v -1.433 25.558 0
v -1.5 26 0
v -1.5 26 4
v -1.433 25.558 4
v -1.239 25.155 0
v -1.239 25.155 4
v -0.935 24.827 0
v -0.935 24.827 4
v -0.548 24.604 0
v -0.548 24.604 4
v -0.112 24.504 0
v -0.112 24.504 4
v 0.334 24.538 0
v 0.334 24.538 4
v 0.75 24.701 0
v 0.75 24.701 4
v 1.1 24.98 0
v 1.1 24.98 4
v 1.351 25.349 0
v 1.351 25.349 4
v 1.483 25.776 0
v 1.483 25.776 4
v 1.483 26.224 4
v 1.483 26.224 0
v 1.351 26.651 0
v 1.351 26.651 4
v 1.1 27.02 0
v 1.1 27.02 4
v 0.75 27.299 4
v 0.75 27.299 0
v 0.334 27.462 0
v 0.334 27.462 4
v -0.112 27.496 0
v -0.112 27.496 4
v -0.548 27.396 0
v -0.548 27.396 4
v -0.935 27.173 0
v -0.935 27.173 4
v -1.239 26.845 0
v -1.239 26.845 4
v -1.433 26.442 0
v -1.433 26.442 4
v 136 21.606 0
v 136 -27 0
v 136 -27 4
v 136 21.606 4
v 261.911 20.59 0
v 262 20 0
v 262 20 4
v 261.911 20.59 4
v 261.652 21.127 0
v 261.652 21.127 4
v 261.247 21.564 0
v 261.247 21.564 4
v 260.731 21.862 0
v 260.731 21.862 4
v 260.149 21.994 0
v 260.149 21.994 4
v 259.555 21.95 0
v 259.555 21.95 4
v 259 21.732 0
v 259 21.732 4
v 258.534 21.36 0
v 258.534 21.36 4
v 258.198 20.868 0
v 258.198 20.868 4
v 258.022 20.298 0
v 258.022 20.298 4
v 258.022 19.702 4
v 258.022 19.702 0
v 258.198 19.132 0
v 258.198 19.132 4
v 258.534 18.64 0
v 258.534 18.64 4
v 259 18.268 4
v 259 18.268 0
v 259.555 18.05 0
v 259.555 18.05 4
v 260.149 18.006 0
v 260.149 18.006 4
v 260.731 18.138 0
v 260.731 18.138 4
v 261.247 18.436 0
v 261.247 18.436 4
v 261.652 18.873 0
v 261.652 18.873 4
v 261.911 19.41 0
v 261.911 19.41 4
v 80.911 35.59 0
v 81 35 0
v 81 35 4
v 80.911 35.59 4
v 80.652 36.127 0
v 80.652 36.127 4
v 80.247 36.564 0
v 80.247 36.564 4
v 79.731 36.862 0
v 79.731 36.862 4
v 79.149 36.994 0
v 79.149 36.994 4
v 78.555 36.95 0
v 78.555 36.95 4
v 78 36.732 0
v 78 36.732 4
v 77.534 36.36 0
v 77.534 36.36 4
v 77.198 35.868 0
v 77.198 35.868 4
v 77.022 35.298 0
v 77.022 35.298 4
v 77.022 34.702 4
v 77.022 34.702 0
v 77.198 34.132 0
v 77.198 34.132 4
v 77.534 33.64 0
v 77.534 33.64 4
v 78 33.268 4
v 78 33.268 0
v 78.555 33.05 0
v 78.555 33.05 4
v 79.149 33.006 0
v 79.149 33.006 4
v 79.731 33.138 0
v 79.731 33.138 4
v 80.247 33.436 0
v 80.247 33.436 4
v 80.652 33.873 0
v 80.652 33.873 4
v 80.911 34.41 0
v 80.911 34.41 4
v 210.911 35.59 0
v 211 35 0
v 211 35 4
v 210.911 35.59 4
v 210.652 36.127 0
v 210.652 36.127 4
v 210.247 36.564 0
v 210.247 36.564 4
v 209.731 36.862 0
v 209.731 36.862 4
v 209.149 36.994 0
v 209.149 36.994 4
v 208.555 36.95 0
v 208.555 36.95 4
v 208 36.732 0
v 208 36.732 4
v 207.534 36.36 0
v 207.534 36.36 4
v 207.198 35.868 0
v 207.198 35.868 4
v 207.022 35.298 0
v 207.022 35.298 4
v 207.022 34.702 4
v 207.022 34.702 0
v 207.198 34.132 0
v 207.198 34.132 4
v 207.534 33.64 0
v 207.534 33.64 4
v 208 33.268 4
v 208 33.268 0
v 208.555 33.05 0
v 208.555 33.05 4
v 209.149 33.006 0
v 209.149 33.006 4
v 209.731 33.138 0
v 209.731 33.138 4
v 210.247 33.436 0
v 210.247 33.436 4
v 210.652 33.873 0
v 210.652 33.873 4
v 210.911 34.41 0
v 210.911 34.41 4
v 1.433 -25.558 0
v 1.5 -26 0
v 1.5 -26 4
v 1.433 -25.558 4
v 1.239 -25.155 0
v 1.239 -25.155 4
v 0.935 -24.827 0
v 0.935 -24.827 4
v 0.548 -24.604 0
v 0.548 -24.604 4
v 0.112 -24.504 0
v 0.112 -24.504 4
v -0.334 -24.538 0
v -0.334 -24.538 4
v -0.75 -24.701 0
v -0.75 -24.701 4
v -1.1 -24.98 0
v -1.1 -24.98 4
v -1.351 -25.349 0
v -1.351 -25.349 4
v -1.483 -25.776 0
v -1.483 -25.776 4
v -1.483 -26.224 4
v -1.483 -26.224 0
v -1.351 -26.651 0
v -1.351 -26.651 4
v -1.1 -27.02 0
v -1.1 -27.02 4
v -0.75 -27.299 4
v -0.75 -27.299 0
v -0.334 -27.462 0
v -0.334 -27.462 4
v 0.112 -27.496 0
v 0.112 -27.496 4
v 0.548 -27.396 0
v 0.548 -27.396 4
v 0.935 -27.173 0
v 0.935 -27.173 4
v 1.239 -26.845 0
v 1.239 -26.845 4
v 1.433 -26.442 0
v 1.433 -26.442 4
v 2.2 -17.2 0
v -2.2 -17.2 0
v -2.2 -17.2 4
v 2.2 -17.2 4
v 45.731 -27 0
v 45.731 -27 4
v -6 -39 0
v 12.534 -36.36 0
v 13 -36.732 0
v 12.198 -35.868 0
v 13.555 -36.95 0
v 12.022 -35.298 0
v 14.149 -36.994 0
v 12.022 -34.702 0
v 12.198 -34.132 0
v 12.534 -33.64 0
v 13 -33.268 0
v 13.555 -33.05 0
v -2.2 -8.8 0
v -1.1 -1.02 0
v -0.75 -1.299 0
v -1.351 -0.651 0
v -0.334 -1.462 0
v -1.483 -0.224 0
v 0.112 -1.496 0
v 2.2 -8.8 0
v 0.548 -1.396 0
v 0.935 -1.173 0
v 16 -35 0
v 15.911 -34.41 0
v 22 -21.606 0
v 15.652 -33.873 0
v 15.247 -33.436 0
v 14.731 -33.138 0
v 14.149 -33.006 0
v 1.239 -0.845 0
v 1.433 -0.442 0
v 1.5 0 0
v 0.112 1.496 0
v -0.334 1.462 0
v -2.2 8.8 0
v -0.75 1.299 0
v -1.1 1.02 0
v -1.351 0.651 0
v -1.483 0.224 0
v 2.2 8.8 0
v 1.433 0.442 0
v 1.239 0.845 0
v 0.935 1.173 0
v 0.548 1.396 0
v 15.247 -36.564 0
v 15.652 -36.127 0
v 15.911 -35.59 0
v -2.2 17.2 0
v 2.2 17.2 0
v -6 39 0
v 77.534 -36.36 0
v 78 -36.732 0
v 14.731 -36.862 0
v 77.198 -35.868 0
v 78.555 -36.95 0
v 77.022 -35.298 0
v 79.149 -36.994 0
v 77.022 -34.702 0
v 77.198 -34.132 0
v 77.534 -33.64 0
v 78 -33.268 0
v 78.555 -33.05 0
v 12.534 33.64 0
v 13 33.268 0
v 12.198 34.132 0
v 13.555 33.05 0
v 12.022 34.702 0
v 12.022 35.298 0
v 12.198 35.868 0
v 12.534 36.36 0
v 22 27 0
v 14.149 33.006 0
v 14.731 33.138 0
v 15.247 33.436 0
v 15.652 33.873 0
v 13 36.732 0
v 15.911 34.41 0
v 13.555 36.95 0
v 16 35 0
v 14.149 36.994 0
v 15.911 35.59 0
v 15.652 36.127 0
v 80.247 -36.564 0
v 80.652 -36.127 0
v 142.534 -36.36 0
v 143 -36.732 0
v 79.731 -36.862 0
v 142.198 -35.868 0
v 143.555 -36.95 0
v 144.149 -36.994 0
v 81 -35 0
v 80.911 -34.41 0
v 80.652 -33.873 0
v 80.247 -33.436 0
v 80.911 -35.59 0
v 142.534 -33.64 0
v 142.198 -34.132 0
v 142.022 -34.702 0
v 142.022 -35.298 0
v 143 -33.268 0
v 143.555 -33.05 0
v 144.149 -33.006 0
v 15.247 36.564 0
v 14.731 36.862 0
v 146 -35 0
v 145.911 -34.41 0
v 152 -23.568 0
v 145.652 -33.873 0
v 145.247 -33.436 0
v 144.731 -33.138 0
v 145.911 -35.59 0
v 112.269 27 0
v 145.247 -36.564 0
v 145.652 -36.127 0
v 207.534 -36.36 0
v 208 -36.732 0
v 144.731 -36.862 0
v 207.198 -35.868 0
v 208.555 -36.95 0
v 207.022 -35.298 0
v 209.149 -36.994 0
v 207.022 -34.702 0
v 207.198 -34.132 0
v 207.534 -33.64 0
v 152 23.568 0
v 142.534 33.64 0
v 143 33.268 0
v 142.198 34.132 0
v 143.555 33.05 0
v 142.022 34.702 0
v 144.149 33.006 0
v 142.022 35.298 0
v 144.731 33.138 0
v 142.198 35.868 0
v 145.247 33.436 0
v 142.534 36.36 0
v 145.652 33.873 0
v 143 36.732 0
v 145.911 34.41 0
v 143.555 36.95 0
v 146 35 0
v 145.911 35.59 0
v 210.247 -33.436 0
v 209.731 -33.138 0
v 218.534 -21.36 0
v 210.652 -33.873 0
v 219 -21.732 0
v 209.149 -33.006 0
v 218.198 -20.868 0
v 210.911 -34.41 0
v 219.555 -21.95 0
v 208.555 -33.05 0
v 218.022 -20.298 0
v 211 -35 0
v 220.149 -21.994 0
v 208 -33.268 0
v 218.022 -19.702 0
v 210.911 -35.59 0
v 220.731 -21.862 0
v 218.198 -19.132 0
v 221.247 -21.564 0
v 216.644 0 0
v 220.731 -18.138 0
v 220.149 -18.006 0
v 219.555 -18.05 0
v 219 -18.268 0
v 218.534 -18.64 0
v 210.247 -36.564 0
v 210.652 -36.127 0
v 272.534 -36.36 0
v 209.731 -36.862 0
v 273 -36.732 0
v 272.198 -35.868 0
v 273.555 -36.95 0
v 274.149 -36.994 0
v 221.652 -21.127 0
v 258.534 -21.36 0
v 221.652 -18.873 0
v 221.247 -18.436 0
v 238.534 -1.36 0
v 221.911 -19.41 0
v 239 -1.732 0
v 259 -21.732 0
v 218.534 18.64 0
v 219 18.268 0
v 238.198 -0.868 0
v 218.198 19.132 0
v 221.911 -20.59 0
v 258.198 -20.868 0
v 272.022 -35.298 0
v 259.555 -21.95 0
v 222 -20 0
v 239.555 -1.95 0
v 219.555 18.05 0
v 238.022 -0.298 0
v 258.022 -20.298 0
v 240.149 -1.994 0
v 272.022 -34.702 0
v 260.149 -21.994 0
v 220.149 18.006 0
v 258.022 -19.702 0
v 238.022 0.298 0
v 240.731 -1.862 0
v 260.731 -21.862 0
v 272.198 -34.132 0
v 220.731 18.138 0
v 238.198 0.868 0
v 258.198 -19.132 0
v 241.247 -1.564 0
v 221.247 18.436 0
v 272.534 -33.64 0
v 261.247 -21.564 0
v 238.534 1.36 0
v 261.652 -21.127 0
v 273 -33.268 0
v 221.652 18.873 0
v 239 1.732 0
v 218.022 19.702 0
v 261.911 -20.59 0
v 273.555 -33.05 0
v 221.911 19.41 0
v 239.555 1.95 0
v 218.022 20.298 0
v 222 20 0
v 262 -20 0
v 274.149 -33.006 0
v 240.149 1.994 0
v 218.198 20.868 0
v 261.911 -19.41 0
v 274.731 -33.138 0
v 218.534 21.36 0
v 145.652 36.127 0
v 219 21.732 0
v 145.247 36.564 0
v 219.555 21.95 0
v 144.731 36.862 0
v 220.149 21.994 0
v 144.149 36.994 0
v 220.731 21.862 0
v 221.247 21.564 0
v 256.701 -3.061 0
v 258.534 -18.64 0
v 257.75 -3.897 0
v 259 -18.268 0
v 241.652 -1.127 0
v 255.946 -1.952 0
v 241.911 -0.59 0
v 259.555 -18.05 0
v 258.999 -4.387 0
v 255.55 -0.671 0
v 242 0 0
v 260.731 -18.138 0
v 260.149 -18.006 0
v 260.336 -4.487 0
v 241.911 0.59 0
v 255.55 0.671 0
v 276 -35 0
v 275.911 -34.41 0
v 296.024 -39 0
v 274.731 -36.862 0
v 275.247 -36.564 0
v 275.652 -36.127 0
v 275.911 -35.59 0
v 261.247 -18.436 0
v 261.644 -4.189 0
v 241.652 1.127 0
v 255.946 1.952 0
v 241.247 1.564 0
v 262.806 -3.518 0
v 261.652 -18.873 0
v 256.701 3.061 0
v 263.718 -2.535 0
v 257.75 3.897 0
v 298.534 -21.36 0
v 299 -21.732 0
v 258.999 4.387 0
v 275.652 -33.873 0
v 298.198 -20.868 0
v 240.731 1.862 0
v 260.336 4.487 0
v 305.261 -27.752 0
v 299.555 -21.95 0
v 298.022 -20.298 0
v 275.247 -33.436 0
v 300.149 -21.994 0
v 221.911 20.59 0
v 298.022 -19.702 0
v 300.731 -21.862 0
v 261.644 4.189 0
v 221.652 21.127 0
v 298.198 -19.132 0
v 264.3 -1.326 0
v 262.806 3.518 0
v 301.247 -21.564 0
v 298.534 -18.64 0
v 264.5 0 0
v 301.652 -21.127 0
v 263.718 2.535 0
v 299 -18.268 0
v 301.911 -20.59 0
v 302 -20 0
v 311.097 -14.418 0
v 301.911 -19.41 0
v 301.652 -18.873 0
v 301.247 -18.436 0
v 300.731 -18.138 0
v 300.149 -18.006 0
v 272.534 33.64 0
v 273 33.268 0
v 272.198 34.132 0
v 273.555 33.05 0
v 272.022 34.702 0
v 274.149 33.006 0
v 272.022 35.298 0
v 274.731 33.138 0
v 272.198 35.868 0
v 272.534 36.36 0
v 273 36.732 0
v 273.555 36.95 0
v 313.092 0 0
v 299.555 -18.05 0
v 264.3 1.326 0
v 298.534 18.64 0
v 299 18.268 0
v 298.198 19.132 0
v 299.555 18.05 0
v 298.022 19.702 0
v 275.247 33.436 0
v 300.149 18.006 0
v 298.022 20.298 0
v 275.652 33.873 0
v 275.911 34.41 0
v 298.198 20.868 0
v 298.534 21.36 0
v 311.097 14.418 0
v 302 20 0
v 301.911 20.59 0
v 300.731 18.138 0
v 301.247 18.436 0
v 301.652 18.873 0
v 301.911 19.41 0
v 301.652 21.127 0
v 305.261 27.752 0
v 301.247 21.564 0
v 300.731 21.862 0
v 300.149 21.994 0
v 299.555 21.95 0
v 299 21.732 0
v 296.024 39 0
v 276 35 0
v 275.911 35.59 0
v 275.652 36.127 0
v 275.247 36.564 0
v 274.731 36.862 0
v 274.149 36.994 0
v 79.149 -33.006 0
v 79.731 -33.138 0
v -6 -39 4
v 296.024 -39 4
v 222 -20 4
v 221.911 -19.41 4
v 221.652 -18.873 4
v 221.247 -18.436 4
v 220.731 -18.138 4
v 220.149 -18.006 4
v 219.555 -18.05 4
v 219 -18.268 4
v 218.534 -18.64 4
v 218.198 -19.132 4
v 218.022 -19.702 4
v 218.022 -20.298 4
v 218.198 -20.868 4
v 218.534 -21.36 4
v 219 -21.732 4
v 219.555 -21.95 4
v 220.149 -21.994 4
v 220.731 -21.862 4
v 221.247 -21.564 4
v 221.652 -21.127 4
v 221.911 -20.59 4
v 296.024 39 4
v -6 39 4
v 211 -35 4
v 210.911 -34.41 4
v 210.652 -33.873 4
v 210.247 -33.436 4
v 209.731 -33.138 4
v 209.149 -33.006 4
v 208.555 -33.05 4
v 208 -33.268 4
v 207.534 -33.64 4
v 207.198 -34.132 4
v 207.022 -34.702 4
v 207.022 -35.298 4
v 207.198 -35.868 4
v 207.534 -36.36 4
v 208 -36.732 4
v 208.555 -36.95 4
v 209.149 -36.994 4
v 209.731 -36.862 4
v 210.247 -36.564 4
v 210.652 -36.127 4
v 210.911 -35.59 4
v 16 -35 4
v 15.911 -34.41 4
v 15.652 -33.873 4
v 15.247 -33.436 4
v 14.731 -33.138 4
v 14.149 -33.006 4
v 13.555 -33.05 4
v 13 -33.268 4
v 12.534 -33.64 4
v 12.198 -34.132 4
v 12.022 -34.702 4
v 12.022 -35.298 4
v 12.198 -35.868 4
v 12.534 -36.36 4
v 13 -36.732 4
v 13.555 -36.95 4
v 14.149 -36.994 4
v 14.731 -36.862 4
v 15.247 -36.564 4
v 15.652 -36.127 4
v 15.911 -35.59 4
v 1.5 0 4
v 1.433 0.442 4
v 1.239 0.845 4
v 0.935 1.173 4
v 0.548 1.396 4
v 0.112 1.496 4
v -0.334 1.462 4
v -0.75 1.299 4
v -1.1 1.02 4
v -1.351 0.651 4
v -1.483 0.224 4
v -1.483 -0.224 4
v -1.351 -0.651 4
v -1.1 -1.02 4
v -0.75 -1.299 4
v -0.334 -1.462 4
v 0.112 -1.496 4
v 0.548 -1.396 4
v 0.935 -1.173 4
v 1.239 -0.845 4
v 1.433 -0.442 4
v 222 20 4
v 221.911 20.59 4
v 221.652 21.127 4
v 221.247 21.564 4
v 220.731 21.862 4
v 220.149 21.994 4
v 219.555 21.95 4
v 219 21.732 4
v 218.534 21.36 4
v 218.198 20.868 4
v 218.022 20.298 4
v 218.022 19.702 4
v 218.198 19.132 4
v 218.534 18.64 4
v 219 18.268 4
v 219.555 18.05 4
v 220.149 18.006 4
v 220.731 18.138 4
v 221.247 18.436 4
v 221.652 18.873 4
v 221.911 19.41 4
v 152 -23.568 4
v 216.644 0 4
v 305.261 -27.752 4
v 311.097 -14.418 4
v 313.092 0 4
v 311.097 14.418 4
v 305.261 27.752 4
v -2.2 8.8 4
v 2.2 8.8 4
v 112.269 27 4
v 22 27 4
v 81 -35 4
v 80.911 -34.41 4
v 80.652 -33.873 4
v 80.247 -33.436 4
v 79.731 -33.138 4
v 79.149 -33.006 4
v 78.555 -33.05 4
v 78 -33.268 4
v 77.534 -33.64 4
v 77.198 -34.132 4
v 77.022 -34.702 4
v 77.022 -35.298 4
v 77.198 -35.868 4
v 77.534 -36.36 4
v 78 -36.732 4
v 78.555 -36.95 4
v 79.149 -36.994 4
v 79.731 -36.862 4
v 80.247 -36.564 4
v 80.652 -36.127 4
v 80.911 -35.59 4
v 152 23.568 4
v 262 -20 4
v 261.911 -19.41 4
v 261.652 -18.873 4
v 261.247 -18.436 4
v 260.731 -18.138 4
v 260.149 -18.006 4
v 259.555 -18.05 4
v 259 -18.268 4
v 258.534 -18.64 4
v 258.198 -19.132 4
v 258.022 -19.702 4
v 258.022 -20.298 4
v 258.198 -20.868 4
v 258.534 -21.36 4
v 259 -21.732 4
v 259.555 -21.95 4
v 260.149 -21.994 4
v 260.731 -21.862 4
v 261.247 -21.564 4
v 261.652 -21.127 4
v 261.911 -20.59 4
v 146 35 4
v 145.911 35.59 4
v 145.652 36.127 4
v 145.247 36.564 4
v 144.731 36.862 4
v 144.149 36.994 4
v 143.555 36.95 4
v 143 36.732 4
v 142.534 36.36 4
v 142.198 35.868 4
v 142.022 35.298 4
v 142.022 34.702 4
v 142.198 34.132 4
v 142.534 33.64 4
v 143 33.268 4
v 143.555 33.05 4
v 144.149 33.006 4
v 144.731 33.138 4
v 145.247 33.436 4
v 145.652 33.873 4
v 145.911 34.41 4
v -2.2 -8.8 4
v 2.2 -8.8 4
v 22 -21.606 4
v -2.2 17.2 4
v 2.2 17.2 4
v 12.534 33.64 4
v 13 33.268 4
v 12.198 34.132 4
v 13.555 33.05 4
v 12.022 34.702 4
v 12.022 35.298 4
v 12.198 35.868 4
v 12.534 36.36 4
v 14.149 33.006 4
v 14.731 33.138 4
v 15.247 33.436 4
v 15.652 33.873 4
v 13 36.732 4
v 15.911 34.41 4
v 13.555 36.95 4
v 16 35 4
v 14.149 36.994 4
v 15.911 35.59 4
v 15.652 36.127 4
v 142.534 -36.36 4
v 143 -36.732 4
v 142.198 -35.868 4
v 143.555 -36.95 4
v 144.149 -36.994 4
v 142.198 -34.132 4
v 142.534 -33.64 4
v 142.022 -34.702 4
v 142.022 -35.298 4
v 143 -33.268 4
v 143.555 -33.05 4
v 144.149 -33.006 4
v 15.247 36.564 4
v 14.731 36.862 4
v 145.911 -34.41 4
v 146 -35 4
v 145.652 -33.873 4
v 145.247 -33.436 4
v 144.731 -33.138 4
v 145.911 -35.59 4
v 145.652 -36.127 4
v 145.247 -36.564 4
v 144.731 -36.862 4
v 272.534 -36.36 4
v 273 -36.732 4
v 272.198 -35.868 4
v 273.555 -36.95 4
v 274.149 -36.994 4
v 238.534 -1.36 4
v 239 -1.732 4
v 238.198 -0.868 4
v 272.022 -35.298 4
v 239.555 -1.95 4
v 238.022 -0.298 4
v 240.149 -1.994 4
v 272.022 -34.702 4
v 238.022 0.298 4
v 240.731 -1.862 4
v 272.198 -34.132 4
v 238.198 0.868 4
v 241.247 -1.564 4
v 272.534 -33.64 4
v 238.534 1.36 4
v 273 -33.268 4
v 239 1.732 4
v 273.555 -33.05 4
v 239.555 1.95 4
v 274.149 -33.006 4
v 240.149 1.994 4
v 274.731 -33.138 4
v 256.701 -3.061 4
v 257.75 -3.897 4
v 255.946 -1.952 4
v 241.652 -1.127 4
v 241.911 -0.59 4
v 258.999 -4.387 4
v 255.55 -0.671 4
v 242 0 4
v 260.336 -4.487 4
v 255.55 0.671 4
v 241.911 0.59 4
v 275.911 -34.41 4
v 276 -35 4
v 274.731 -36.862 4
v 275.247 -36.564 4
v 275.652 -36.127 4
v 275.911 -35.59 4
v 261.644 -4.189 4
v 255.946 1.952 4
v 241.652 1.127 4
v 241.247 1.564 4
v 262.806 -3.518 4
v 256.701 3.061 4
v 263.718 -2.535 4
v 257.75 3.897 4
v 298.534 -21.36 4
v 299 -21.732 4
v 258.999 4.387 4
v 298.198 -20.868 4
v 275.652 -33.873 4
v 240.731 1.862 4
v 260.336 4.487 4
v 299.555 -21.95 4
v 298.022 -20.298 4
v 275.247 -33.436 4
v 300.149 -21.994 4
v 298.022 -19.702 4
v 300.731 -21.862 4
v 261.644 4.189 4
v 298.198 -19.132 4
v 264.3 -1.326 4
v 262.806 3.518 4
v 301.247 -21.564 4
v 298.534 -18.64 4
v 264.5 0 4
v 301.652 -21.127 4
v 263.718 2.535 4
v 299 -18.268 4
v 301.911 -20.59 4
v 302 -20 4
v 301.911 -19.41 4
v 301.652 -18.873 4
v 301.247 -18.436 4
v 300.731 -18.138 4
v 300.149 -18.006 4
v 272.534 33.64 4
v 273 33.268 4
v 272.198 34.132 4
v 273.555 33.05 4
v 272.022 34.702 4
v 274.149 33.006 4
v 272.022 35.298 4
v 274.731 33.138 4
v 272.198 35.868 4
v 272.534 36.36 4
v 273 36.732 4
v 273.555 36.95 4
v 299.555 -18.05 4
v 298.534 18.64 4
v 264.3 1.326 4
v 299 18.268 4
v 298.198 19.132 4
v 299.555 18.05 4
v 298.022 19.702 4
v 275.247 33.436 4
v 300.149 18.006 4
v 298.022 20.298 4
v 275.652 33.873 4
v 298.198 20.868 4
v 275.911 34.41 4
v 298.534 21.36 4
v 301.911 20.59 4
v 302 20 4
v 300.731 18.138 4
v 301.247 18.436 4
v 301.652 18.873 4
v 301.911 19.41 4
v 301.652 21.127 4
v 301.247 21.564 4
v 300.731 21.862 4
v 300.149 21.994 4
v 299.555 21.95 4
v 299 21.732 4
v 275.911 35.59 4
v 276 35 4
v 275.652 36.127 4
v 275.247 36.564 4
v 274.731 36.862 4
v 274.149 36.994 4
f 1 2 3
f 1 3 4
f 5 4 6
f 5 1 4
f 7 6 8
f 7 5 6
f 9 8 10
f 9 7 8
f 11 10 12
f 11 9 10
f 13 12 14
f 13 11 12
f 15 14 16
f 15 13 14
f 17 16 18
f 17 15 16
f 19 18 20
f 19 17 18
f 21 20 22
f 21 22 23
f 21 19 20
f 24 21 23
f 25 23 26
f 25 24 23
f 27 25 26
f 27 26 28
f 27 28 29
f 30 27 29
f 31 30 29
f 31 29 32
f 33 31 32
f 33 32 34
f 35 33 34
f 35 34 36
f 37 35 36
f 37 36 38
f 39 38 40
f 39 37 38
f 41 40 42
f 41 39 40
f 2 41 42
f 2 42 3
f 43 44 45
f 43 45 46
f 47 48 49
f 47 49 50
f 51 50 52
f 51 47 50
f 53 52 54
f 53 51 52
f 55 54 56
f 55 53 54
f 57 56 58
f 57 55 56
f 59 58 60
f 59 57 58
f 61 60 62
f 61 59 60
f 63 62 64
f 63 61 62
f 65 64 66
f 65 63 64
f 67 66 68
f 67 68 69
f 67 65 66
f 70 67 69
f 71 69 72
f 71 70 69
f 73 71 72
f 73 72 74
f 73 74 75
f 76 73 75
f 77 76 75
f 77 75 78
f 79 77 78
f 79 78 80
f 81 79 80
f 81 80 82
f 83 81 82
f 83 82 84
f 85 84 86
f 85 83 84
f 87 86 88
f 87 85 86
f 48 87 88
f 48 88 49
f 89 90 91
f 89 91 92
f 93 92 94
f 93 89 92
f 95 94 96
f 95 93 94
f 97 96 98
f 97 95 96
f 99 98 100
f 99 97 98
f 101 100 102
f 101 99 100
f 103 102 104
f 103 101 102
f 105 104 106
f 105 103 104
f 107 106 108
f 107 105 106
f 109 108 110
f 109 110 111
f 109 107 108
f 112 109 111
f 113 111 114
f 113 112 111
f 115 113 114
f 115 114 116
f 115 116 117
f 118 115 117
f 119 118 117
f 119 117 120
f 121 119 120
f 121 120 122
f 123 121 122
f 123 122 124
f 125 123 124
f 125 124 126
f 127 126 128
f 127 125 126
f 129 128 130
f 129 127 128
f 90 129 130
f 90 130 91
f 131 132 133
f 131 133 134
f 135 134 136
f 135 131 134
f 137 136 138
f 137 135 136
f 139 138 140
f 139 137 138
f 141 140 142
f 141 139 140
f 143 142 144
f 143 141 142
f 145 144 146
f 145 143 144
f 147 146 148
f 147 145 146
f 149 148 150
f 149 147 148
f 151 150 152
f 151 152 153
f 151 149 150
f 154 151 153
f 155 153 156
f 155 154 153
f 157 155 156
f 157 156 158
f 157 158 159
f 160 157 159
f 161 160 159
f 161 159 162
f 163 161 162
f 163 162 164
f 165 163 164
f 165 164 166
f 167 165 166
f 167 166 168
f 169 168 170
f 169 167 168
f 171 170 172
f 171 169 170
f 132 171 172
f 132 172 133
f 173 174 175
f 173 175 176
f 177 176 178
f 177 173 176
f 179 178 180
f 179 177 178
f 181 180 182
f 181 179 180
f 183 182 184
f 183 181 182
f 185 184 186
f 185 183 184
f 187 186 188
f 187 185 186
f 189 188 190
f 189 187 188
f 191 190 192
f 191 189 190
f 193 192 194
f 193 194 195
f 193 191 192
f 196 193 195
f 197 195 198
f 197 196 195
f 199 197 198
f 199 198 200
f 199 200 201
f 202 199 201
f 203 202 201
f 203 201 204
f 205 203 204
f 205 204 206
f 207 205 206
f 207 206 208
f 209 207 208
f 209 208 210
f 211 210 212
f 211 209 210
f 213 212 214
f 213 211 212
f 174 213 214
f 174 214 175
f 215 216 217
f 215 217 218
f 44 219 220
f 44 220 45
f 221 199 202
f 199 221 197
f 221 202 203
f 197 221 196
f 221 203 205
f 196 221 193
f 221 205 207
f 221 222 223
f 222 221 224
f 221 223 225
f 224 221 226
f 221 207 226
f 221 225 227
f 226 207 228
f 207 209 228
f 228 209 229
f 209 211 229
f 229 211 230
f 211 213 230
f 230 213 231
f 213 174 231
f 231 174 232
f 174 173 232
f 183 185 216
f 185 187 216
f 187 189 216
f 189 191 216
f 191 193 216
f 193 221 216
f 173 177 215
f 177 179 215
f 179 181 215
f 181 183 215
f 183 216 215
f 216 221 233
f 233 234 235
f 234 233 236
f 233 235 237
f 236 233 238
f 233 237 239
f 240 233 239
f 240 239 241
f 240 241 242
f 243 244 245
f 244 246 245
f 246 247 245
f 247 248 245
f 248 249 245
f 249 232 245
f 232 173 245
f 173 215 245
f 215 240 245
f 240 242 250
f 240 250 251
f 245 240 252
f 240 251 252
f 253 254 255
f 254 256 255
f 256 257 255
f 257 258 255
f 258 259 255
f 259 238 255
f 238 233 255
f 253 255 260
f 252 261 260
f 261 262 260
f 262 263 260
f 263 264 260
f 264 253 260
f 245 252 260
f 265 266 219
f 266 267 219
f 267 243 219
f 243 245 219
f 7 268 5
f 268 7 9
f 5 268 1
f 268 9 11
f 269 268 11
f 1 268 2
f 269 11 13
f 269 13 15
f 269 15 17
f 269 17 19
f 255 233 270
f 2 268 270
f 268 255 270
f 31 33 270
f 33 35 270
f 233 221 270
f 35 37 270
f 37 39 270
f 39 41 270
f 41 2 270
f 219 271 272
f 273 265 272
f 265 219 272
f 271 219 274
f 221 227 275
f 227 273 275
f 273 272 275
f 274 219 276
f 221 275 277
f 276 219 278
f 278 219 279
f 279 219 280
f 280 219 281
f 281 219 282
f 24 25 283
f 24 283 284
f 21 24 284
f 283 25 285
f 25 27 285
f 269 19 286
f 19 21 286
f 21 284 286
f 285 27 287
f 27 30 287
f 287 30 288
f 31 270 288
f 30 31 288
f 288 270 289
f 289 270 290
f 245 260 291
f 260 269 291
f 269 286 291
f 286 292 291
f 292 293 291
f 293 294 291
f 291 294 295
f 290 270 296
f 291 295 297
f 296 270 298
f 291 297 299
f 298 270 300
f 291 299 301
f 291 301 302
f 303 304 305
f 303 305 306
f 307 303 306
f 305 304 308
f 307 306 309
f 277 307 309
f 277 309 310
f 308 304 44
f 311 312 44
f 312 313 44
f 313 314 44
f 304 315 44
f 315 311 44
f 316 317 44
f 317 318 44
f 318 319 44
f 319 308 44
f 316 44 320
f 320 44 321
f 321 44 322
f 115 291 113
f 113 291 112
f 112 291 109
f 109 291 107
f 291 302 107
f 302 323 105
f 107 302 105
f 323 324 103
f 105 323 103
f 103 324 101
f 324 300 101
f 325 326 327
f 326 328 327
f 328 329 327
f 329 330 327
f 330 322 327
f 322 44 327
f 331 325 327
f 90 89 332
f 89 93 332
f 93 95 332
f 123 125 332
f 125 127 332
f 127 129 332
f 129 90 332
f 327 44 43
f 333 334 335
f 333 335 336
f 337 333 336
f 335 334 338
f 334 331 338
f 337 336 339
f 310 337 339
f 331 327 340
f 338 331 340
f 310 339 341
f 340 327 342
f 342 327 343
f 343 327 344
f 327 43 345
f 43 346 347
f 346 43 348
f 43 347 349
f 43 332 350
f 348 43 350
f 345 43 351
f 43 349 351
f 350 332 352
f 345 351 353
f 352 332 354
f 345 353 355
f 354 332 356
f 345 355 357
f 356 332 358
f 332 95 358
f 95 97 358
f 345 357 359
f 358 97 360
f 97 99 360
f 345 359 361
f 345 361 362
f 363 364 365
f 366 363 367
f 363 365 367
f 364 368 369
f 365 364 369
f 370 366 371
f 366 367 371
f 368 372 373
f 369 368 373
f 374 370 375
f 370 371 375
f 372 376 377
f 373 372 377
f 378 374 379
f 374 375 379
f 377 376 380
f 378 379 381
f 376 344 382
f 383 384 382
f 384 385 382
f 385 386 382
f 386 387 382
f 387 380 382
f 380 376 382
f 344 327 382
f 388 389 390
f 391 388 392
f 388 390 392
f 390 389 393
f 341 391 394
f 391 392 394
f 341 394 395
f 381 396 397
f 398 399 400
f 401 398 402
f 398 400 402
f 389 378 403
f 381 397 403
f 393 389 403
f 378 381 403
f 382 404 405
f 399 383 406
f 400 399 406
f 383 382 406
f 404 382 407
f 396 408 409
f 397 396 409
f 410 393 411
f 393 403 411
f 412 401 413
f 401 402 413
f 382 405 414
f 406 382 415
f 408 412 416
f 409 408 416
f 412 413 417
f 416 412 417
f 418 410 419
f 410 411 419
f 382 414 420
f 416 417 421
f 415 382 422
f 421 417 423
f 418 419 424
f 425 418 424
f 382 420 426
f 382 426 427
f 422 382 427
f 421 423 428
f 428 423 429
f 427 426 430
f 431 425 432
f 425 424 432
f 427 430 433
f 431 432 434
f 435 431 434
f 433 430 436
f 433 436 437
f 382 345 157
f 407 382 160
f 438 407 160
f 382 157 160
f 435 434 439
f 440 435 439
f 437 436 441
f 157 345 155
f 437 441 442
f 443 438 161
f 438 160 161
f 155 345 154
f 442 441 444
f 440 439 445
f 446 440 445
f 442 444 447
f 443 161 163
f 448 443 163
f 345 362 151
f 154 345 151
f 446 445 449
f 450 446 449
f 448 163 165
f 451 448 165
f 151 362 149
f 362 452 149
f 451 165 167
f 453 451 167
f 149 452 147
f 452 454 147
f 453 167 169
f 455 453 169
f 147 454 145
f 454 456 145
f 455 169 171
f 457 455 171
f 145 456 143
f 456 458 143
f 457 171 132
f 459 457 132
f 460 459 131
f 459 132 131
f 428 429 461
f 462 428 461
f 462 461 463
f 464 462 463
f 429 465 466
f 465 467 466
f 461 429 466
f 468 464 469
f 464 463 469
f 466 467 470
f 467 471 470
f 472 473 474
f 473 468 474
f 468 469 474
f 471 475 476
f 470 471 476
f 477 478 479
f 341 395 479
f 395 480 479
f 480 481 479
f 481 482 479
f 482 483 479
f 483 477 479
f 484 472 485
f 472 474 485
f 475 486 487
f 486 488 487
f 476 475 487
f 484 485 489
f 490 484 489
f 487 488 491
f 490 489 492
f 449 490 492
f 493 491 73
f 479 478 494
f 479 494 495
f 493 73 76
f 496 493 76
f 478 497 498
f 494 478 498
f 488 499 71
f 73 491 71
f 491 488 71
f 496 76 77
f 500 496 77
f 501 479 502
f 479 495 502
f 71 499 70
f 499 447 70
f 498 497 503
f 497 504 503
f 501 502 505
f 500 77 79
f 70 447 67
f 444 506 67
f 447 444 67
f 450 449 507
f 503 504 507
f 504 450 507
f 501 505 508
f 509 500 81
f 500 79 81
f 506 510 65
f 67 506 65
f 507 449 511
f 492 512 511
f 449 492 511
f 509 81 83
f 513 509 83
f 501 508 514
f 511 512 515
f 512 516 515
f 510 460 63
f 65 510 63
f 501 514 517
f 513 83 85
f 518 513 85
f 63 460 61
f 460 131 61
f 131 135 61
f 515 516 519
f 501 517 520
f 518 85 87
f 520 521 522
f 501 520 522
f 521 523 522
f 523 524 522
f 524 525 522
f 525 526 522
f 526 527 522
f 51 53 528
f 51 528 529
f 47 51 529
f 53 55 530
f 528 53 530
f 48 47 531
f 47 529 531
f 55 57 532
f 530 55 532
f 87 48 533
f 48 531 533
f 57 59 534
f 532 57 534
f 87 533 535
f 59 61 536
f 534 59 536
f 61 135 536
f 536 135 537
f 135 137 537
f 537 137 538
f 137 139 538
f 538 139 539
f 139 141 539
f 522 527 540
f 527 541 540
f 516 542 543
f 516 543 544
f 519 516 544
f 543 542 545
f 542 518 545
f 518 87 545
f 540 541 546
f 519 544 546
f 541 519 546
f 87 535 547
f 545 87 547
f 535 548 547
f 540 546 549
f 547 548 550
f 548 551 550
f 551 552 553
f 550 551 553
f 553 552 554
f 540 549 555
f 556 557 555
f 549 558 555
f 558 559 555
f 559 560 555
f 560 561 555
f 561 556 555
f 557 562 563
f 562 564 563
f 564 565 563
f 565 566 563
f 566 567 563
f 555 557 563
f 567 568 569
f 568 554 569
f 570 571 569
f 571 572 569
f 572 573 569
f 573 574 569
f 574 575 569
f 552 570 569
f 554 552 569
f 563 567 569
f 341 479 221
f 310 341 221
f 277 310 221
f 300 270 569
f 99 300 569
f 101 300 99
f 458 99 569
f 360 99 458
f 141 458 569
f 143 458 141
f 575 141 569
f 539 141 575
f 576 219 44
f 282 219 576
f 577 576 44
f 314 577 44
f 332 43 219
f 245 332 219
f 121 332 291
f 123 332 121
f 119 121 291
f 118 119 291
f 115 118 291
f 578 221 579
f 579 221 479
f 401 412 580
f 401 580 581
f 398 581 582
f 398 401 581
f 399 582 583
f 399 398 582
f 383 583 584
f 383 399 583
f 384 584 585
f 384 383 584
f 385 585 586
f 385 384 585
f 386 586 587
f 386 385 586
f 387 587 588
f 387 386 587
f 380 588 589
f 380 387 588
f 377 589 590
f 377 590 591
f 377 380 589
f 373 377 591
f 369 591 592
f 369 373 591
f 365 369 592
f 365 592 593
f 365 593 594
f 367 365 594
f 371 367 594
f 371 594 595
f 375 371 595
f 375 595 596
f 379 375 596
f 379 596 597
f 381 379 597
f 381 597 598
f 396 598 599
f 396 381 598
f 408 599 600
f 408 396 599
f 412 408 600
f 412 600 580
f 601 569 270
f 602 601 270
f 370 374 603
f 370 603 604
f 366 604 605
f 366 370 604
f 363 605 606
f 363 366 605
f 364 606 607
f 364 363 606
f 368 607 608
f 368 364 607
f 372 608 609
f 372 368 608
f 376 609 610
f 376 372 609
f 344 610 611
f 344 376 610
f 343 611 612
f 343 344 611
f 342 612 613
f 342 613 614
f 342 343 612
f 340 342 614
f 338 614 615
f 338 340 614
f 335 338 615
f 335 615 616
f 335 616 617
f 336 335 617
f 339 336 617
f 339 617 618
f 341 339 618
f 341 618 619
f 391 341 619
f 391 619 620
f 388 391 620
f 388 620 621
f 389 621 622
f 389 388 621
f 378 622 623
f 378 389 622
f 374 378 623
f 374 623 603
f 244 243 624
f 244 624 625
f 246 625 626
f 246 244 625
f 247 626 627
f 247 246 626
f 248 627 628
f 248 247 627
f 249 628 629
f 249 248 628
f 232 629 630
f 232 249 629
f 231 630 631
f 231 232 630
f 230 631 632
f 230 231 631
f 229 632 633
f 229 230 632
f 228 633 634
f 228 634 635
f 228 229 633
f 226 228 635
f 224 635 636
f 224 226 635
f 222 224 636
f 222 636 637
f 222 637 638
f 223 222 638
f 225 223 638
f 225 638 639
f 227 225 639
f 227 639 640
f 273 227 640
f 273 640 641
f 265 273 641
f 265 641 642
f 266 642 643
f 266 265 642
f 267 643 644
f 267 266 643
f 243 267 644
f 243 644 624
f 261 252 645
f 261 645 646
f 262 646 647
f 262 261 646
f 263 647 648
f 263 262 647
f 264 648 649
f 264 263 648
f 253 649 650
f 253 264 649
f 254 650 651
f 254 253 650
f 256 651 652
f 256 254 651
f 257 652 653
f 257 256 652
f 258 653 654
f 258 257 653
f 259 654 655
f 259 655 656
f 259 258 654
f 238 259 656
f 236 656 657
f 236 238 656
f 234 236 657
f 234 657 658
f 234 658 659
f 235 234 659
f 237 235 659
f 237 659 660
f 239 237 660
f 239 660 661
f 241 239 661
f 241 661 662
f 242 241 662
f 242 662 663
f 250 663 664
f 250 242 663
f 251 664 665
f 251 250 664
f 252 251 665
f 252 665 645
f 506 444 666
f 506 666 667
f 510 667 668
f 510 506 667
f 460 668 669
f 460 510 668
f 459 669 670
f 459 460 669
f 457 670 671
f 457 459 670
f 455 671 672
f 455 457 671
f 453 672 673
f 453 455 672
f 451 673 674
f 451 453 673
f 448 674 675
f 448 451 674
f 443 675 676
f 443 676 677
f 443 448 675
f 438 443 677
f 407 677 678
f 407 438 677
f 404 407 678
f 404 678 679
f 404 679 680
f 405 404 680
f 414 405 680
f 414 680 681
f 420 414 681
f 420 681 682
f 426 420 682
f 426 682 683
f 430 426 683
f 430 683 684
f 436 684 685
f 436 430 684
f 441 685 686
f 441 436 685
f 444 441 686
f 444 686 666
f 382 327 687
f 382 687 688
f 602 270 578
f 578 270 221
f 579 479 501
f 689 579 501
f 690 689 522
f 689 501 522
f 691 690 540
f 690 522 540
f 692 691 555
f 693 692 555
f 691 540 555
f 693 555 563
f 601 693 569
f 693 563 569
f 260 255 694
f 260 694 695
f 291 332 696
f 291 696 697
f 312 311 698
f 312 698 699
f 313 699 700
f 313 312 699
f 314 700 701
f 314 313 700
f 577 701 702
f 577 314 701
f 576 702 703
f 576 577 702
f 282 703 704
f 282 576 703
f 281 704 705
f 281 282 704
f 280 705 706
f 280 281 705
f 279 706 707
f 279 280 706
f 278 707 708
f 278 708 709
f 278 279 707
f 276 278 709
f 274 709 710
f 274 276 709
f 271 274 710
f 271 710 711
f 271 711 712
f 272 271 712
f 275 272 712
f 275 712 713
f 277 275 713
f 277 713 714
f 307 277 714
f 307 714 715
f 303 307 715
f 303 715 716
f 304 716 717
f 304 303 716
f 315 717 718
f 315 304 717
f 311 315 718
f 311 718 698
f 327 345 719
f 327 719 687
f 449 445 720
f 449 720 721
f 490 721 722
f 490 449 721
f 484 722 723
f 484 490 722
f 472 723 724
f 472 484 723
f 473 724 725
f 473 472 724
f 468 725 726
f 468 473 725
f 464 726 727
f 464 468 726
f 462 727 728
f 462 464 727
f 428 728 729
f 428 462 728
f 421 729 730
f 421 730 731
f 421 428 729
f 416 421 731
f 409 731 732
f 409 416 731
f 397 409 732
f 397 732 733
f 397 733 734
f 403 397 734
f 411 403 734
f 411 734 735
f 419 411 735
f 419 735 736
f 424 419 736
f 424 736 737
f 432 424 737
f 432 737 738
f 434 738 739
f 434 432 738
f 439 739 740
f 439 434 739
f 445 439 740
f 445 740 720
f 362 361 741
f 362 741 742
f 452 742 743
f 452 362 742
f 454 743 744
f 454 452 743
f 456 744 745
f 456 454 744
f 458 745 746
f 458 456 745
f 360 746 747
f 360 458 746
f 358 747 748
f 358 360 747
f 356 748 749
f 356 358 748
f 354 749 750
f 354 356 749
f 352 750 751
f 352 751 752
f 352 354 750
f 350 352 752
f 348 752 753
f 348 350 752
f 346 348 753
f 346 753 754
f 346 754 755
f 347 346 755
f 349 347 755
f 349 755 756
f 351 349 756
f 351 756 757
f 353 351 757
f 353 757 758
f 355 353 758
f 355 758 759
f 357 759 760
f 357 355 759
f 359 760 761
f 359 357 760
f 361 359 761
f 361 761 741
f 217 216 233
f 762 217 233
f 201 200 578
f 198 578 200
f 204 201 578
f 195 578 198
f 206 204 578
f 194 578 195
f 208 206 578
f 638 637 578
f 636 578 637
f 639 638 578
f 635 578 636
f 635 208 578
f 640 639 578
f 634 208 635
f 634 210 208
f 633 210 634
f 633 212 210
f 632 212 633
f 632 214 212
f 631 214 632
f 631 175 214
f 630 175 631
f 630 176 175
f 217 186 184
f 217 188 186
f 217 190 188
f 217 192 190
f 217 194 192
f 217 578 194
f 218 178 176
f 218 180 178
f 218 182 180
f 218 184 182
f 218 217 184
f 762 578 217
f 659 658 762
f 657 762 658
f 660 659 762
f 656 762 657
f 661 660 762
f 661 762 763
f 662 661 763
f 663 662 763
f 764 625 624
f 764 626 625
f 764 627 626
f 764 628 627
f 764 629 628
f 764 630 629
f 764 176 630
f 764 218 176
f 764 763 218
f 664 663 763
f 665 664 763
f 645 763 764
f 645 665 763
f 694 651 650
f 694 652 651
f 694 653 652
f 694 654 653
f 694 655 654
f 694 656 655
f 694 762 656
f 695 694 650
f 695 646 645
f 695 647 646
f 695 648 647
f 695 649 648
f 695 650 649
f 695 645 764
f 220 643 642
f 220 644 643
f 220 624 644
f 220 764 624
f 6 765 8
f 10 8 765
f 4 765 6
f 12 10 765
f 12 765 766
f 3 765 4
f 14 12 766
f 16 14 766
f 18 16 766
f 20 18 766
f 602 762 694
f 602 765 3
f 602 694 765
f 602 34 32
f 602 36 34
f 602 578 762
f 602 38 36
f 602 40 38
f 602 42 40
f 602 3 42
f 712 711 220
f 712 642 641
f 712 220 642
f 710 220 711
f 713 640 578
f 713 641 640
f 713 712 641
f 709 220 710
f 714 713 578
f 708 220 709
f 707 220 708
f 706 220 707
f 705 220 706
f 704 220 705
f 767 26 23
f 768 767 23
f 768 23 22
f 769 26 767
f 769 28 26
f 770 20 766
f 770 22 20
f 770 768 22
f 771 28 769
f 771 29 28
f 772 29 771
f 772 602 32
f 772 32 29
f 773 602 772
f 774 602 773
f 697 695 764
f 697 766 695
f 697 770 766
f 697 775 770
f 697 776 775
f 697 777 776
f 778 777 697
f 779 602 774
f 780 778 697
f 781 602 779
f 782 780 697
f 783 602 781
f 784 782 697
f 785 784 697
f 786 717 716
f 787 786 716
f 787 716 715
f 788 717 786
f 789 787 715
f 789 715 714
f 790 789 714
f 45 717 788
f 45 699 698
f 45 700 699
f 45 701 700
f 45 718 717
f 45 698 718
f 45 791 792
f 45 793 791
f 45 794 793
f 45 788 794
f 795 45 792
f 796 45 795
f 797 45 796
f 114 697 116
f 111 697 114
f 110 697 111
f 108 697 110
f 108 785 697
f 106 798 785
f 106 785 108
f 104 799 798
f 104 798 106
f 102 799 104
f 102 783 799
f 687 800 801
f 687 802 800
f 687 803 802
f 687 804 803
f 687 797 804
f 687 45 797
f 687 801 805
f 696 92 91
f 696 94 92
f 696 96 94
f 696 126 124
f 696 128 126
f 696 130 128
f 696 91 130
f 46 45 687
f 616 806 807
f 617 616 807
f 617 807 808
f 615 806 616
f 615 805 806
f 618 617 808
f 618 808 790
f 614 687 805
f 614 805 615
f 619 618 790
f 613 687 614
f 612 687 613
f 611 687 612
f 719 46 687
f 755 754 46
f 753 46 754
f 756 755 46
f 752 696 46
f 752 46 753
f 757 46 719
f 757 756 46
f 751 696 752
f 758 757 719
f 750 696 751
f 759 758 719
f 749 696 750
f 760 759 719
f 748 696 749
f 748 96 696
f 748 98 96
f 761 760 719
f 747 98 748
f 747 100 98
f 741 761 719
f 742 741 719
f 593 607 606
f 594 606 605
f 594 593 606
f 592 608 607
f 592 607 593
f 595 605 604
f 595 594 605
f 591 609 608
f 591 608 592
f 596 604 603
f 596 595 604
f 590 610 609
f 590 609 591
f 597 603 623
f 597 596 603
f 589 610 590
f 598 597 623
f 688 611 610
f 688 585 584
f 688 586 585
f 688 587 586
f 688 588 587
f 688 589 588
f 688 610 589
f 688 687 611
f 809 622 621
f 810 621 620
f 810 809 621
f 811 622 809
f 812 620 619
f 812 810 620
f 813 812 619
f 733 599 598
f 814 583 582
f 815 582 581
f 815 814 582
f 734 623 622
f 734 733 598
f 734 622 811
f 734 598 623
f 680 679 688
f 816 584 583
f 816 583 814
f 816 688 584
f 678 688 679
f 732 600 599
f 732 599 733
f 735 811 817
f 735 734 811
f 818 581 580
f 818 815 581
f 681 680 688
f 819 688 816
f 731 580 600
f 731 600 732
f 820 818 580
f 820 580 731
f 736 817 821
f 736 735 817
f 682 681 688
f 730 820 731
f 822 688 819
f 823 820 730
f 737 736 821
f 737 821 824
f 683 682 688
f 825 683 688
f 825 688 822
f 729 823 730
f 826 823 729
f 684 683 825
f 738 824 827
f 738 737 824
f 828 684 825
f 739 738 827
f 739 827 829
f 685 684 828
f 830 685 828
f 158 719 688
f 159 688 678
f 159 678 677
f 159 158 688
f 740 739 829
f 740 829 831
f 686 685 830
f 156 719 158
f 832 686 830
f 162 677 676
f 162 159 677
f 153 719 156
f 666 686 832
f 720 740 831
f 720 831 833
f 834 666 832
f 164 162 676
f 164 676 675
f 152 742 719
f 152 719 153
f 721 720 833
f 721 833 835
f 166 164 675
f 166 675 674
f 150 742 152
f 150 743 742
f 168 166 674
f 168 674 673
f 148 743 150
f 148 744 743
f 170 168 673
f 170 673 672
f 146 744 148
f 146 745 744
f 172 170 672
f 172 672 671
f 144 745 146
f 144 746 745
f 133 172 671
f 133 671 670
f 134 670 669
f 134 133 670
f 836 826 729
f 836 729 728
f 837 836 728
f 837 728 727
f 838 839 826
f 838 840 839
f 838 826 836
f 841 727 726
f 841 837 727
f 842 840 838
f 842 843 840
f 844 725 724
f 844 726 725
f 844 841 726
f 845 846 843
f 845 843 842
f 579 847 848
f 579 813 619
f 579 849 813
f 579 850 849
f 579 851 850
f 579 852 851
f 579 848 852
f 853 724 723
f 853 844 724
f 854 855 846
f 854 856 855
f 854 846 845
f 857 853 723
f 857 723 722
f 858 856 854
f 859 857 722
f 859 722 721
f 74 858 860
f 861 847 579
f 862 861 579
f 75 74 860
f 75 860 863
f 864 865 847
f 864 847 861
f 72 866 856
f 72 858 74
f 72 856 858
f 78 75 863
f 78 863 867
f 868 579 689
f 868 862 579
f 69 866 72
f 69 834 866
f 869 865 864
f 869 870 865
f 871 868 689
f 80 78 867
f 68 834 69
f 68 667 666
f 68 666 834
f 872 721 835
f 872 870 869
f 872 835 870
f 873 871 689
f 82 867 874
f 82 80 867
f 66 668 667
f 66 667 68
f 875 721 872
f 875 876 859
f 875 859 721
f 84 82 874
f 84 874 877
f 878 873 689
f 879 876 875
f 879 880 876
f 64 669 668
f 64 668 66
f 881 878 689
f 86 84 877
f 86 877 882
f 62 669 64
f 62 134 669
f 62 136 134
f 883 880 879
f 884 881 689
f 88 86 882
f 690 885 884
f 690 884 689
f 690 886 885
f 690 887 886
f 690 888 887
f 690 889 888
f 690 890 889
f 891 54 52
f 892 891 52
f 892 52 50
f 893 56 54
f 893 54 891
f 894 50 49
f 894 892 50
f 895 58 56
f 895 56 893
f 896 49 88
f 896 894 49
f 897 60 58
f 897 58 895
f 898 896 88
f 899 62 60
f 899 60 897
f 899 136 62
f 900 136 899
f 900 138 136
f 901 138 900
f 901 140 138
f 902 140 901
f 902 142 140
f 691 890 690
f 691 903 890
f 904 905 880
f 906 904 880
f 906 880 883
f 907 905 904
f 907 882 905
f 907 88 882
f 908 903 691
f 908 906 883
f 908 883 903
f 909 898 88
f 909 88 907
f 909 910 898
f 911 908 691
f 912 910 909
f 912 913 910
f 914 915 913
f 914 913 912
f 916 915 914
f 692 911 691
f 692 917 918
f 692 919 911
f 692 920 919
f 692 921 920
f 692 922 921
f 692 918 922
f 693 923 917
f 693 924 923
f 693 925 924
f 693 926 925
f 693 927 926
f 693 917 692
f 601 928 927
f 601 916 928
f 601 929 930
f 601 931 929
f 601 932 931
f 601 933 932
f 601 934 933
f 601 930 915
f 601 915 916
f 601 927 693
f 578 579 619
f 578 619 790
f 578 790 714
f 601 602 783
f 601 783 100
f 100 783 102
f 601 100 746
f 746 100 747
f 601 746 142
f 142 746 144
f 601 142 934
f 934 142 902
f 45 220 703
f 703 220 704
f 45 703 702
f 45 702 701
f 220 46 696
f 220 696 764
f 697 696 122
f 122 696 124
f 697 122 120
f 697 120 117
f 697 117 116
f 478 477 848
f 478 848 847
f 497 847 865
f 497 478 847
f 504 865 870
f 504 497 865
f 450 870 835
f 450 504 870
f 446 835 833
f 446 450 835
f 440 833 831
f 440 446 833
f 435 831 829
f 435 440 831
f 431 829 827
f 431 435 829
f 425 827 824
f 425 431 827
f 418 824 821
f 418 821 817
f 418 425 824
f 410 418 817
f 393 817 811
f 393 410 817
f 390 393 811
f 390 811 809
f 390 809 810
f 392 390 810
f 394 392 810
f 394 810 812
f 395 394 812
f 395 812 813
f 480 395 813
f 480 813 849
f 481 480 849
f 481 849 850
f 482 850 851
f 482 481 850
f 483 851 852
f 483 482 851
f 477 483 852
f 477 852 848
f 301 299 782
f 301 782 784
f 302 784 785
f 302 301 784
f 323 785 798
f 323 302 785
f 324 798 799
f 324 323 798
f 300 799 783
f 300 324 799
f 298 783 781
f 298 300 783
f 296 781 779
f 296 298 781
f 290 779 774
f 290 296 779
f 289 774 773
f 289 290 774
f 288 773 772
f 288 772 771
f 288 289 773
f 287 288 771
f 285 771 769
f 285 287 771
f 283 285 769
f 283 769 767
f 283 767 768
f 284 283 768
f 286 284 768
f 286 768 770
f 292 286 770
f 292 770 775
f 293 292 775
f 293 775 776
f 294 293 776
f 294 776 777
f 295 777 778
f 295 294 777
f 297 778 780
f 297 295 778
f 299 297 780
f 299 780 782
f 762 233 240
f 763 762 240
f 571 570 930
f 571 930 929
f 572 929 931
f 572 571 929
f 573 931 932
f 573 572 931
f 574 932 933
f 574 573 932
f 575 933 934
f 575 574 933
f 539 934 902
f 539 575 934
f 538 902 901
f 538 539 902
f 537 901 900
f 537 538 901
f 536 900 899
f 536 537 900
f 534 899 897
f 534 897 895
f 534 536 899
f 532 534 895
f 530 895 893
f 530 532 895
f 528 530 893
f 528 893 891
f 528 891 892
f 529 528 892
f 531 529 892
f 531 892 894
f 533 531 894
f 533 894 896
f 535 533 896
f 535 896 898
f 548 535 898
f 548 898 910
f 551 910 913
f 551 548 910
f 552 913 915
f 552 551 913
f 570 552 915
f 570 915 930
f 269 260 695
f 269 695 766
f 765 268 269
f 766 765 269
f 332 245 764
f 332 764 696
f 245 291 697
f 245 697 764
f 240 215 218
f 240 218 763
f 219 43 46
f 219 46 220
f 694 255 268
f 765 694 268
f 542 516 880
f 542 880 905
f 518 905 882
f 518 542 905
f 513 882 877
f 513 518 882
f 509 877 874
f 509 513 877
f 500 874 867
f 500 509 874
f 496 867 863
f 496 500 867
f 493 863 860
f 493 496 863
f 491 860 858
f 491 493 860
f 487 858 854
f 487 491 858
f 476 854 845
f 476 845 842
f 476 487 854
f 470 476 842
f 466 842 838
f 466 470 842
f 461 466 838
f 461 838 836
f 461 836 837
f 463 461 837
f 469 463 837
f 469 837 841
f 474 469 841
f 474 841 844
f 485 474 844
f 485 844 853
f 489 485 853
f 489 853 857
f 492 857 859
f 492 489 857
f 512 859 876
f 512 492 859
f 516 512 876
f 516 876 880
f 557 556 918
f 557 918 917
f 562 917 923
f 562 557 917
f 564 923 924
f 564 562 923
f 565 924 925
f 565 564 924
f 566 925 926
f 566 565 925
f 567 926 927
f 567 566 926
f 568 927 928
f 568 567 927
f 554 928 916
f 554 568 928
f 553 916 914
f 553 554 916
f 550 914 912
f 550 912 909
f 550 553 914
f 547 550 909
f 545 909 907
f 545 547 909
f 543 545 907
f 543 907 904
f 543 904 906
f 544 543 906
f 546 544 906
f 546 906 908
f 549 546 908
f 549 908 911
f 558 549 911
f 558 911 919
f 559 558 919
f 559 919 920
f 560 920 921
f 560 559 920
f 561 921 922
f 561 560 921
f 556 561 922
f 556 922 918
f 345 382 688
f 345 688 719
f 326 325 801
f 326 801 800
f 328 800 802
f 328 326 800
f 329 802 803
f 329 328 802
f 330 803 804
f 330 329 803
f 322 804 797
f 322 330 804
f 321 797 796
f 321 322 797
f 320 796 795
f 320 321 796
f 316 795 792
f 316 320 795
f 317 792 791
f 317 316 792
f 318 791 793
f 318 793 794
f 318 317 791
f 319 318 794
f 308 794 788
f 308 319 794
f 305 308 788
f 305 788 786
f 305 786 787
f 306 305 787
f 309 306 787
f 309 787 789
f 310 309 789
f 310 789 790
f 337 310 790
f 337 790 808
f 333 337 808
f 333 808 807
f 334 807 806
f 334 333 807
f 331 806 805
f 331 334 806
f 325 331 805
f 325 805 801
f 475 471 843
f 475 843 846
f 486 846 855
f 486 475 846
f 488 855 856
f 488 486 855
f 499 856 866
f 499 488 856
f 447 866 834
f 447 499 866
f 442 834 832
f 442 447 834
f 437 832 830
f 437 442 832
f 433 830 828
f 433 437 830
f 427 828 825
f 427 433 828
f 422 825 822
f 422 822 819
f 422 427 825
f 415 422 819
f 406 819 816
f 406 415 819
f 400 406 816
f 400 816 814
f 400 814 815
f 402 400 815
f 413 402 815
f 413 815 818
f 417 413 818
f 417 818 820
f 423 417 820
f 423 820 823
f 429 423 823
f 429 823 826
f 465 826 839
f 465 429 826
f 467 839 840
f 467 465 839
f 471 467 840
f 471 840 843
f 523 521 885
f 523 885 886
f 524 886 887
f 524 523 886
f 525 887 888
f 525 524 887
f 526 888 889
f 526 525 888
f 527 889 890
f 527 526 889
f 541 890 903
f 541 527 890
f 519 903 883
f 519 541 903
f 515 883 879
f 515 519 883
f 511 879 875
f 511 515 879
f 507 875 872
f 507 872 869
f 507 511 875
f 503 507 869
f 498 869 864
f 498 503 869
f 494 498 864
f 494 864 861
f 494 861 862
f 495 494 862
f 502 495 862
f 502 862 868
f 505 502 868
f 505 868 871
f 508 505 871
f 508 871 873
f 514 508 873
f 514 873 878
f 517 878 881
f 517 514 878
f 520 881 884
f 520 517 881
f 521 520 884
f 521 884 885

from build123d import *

# Parameters (mm, degrees)
SKETCH_1_R      = 1.5
SKETCH_1_R_2    = 4.5
SKETCH_1_R_3    = 2
SKETCH_1_W      = 4.4
SKETCH_1_H      = 8.4
EXTRUDE_1_DEPTH = 4


with BuildPart() as part:
    # 草图1 → 凸台-拉伸1 (new body)
    with BuildSketch(Plane.XY):
        with BuildLine():
            Line((-6, 39), (-6, -39))
            Line((-6, -39), (296.024297356, -39))
            ThreePointArc((296.024297356, -39), (313.091901454, 0), (296.024297356, 39))
            Line((296.024297356, 39), (-6, 39))
        make_face()
        Circle(SKETCH_1_R, mode=Mode.SUBTRACT)
        with Locations(Location((0, 26, 0), (0, 0, 180))):
            Circle(SKETCH_1_R, mode=Mode.SUBTRACT)
        with Locations((0, -26)):
            Circle(SKETCH_1_R, mode=Mode.SUBTRACT)
        with Locations((260, 0)):
            Circle(SKETCH_1_R_2, mode=Mode.SUBTRACT)
        with Locations((260, 20)):
            Circle(SKETCH_1_R_3, mode=Mode.SUBTRACT)
        with Locations((240, 0)):
            Circle(SKETCH_1_R_3, mode=Mode.SUBTRACT)
        with Locations((300, 20)):
            Circle(SKETCH_1_R_3, mode=Mode.SUBTRACT)
        with Locations((300, -20)):
            Circle(SKETCH_1_R_3, mode=Mode.SUBTRACT)
        with Locations((220, 20)):
            Circle(SKETCH_1_R_3, mode=Mode.SUBTRACT)
        with Locations((220, -20)):
            Circle(SKETCH_1_R_3, mode=Mode.SUBTRACT)
        with Locations((260, -20)):
            Circle(SKETCH_1_R_3, mode=Mode.SUBTRACT)
        with Locations((274, -35)):
            Circle(SKETCH_1_R_3, mode=Mode.SUBTRACT)
        with Locations((209, -35)):
            Circle(SKETCH_1_R_3, mode=Mode.SUBTRACT)
        with Locations((144, -35)):
            Circle(SKETCH_1_R_3, mode=Mode.SUBTRACT)
        with Locations((79, -35)):
            Circle(SKETCH_1_R_3, mode=Mode.SUBTRACT)
        with Locations((14, -35)):
            Circle(SKETCH_1_R_3, mode=Mode.SUBTRACT)
        with Locations((209, 35)):
            Circle(SKETCH_1_R_3, mode=Mode.SUBTRACT)
        with Locations((144, 35)):
            Circle(SKETCH_1_R_3, mode=Mode.SUBTRACT)
        with Locations((79, 35)):
            Circle(SKETCH_1_R_3, mode=Mode.SUBTRACT)
        with Locations((14, 35)):
            Circle(SKETCH_1_R_3, mode=Mode.SUBTRACT)
        with Locations((274, 35)):
            Circle(SKETCH_1_R_3, mode=Mode.SUBTRACT)
        with Locations((0, 13)):
            Rectangle(SKETCH_1_W, SKETCH_1_H, mode=Mode.SUBTRACT)
        with Locations((0, -13)):
            Rectangle(SKETCH_1_W, SKETCH_1_H, mode=Mode.SUBTRACT)
        Polygon((22, -21.606262732), (112.268773645, 27), (22, 27), align=None, mode=Mode.SUBTRACT)
        Polygon((45.731226355, -27), (136, -27), (136, 21.606262732), align=None, mode=Mode.SUBTRACT)
        Polygon((152, -23.568232368), (216.644294496, 0), (152, 23.568232368), align=None, mode=Mode.SUBTRACT)
    extrude(amount=EXTRUDE_1_DEPTH)


solid = part.part
